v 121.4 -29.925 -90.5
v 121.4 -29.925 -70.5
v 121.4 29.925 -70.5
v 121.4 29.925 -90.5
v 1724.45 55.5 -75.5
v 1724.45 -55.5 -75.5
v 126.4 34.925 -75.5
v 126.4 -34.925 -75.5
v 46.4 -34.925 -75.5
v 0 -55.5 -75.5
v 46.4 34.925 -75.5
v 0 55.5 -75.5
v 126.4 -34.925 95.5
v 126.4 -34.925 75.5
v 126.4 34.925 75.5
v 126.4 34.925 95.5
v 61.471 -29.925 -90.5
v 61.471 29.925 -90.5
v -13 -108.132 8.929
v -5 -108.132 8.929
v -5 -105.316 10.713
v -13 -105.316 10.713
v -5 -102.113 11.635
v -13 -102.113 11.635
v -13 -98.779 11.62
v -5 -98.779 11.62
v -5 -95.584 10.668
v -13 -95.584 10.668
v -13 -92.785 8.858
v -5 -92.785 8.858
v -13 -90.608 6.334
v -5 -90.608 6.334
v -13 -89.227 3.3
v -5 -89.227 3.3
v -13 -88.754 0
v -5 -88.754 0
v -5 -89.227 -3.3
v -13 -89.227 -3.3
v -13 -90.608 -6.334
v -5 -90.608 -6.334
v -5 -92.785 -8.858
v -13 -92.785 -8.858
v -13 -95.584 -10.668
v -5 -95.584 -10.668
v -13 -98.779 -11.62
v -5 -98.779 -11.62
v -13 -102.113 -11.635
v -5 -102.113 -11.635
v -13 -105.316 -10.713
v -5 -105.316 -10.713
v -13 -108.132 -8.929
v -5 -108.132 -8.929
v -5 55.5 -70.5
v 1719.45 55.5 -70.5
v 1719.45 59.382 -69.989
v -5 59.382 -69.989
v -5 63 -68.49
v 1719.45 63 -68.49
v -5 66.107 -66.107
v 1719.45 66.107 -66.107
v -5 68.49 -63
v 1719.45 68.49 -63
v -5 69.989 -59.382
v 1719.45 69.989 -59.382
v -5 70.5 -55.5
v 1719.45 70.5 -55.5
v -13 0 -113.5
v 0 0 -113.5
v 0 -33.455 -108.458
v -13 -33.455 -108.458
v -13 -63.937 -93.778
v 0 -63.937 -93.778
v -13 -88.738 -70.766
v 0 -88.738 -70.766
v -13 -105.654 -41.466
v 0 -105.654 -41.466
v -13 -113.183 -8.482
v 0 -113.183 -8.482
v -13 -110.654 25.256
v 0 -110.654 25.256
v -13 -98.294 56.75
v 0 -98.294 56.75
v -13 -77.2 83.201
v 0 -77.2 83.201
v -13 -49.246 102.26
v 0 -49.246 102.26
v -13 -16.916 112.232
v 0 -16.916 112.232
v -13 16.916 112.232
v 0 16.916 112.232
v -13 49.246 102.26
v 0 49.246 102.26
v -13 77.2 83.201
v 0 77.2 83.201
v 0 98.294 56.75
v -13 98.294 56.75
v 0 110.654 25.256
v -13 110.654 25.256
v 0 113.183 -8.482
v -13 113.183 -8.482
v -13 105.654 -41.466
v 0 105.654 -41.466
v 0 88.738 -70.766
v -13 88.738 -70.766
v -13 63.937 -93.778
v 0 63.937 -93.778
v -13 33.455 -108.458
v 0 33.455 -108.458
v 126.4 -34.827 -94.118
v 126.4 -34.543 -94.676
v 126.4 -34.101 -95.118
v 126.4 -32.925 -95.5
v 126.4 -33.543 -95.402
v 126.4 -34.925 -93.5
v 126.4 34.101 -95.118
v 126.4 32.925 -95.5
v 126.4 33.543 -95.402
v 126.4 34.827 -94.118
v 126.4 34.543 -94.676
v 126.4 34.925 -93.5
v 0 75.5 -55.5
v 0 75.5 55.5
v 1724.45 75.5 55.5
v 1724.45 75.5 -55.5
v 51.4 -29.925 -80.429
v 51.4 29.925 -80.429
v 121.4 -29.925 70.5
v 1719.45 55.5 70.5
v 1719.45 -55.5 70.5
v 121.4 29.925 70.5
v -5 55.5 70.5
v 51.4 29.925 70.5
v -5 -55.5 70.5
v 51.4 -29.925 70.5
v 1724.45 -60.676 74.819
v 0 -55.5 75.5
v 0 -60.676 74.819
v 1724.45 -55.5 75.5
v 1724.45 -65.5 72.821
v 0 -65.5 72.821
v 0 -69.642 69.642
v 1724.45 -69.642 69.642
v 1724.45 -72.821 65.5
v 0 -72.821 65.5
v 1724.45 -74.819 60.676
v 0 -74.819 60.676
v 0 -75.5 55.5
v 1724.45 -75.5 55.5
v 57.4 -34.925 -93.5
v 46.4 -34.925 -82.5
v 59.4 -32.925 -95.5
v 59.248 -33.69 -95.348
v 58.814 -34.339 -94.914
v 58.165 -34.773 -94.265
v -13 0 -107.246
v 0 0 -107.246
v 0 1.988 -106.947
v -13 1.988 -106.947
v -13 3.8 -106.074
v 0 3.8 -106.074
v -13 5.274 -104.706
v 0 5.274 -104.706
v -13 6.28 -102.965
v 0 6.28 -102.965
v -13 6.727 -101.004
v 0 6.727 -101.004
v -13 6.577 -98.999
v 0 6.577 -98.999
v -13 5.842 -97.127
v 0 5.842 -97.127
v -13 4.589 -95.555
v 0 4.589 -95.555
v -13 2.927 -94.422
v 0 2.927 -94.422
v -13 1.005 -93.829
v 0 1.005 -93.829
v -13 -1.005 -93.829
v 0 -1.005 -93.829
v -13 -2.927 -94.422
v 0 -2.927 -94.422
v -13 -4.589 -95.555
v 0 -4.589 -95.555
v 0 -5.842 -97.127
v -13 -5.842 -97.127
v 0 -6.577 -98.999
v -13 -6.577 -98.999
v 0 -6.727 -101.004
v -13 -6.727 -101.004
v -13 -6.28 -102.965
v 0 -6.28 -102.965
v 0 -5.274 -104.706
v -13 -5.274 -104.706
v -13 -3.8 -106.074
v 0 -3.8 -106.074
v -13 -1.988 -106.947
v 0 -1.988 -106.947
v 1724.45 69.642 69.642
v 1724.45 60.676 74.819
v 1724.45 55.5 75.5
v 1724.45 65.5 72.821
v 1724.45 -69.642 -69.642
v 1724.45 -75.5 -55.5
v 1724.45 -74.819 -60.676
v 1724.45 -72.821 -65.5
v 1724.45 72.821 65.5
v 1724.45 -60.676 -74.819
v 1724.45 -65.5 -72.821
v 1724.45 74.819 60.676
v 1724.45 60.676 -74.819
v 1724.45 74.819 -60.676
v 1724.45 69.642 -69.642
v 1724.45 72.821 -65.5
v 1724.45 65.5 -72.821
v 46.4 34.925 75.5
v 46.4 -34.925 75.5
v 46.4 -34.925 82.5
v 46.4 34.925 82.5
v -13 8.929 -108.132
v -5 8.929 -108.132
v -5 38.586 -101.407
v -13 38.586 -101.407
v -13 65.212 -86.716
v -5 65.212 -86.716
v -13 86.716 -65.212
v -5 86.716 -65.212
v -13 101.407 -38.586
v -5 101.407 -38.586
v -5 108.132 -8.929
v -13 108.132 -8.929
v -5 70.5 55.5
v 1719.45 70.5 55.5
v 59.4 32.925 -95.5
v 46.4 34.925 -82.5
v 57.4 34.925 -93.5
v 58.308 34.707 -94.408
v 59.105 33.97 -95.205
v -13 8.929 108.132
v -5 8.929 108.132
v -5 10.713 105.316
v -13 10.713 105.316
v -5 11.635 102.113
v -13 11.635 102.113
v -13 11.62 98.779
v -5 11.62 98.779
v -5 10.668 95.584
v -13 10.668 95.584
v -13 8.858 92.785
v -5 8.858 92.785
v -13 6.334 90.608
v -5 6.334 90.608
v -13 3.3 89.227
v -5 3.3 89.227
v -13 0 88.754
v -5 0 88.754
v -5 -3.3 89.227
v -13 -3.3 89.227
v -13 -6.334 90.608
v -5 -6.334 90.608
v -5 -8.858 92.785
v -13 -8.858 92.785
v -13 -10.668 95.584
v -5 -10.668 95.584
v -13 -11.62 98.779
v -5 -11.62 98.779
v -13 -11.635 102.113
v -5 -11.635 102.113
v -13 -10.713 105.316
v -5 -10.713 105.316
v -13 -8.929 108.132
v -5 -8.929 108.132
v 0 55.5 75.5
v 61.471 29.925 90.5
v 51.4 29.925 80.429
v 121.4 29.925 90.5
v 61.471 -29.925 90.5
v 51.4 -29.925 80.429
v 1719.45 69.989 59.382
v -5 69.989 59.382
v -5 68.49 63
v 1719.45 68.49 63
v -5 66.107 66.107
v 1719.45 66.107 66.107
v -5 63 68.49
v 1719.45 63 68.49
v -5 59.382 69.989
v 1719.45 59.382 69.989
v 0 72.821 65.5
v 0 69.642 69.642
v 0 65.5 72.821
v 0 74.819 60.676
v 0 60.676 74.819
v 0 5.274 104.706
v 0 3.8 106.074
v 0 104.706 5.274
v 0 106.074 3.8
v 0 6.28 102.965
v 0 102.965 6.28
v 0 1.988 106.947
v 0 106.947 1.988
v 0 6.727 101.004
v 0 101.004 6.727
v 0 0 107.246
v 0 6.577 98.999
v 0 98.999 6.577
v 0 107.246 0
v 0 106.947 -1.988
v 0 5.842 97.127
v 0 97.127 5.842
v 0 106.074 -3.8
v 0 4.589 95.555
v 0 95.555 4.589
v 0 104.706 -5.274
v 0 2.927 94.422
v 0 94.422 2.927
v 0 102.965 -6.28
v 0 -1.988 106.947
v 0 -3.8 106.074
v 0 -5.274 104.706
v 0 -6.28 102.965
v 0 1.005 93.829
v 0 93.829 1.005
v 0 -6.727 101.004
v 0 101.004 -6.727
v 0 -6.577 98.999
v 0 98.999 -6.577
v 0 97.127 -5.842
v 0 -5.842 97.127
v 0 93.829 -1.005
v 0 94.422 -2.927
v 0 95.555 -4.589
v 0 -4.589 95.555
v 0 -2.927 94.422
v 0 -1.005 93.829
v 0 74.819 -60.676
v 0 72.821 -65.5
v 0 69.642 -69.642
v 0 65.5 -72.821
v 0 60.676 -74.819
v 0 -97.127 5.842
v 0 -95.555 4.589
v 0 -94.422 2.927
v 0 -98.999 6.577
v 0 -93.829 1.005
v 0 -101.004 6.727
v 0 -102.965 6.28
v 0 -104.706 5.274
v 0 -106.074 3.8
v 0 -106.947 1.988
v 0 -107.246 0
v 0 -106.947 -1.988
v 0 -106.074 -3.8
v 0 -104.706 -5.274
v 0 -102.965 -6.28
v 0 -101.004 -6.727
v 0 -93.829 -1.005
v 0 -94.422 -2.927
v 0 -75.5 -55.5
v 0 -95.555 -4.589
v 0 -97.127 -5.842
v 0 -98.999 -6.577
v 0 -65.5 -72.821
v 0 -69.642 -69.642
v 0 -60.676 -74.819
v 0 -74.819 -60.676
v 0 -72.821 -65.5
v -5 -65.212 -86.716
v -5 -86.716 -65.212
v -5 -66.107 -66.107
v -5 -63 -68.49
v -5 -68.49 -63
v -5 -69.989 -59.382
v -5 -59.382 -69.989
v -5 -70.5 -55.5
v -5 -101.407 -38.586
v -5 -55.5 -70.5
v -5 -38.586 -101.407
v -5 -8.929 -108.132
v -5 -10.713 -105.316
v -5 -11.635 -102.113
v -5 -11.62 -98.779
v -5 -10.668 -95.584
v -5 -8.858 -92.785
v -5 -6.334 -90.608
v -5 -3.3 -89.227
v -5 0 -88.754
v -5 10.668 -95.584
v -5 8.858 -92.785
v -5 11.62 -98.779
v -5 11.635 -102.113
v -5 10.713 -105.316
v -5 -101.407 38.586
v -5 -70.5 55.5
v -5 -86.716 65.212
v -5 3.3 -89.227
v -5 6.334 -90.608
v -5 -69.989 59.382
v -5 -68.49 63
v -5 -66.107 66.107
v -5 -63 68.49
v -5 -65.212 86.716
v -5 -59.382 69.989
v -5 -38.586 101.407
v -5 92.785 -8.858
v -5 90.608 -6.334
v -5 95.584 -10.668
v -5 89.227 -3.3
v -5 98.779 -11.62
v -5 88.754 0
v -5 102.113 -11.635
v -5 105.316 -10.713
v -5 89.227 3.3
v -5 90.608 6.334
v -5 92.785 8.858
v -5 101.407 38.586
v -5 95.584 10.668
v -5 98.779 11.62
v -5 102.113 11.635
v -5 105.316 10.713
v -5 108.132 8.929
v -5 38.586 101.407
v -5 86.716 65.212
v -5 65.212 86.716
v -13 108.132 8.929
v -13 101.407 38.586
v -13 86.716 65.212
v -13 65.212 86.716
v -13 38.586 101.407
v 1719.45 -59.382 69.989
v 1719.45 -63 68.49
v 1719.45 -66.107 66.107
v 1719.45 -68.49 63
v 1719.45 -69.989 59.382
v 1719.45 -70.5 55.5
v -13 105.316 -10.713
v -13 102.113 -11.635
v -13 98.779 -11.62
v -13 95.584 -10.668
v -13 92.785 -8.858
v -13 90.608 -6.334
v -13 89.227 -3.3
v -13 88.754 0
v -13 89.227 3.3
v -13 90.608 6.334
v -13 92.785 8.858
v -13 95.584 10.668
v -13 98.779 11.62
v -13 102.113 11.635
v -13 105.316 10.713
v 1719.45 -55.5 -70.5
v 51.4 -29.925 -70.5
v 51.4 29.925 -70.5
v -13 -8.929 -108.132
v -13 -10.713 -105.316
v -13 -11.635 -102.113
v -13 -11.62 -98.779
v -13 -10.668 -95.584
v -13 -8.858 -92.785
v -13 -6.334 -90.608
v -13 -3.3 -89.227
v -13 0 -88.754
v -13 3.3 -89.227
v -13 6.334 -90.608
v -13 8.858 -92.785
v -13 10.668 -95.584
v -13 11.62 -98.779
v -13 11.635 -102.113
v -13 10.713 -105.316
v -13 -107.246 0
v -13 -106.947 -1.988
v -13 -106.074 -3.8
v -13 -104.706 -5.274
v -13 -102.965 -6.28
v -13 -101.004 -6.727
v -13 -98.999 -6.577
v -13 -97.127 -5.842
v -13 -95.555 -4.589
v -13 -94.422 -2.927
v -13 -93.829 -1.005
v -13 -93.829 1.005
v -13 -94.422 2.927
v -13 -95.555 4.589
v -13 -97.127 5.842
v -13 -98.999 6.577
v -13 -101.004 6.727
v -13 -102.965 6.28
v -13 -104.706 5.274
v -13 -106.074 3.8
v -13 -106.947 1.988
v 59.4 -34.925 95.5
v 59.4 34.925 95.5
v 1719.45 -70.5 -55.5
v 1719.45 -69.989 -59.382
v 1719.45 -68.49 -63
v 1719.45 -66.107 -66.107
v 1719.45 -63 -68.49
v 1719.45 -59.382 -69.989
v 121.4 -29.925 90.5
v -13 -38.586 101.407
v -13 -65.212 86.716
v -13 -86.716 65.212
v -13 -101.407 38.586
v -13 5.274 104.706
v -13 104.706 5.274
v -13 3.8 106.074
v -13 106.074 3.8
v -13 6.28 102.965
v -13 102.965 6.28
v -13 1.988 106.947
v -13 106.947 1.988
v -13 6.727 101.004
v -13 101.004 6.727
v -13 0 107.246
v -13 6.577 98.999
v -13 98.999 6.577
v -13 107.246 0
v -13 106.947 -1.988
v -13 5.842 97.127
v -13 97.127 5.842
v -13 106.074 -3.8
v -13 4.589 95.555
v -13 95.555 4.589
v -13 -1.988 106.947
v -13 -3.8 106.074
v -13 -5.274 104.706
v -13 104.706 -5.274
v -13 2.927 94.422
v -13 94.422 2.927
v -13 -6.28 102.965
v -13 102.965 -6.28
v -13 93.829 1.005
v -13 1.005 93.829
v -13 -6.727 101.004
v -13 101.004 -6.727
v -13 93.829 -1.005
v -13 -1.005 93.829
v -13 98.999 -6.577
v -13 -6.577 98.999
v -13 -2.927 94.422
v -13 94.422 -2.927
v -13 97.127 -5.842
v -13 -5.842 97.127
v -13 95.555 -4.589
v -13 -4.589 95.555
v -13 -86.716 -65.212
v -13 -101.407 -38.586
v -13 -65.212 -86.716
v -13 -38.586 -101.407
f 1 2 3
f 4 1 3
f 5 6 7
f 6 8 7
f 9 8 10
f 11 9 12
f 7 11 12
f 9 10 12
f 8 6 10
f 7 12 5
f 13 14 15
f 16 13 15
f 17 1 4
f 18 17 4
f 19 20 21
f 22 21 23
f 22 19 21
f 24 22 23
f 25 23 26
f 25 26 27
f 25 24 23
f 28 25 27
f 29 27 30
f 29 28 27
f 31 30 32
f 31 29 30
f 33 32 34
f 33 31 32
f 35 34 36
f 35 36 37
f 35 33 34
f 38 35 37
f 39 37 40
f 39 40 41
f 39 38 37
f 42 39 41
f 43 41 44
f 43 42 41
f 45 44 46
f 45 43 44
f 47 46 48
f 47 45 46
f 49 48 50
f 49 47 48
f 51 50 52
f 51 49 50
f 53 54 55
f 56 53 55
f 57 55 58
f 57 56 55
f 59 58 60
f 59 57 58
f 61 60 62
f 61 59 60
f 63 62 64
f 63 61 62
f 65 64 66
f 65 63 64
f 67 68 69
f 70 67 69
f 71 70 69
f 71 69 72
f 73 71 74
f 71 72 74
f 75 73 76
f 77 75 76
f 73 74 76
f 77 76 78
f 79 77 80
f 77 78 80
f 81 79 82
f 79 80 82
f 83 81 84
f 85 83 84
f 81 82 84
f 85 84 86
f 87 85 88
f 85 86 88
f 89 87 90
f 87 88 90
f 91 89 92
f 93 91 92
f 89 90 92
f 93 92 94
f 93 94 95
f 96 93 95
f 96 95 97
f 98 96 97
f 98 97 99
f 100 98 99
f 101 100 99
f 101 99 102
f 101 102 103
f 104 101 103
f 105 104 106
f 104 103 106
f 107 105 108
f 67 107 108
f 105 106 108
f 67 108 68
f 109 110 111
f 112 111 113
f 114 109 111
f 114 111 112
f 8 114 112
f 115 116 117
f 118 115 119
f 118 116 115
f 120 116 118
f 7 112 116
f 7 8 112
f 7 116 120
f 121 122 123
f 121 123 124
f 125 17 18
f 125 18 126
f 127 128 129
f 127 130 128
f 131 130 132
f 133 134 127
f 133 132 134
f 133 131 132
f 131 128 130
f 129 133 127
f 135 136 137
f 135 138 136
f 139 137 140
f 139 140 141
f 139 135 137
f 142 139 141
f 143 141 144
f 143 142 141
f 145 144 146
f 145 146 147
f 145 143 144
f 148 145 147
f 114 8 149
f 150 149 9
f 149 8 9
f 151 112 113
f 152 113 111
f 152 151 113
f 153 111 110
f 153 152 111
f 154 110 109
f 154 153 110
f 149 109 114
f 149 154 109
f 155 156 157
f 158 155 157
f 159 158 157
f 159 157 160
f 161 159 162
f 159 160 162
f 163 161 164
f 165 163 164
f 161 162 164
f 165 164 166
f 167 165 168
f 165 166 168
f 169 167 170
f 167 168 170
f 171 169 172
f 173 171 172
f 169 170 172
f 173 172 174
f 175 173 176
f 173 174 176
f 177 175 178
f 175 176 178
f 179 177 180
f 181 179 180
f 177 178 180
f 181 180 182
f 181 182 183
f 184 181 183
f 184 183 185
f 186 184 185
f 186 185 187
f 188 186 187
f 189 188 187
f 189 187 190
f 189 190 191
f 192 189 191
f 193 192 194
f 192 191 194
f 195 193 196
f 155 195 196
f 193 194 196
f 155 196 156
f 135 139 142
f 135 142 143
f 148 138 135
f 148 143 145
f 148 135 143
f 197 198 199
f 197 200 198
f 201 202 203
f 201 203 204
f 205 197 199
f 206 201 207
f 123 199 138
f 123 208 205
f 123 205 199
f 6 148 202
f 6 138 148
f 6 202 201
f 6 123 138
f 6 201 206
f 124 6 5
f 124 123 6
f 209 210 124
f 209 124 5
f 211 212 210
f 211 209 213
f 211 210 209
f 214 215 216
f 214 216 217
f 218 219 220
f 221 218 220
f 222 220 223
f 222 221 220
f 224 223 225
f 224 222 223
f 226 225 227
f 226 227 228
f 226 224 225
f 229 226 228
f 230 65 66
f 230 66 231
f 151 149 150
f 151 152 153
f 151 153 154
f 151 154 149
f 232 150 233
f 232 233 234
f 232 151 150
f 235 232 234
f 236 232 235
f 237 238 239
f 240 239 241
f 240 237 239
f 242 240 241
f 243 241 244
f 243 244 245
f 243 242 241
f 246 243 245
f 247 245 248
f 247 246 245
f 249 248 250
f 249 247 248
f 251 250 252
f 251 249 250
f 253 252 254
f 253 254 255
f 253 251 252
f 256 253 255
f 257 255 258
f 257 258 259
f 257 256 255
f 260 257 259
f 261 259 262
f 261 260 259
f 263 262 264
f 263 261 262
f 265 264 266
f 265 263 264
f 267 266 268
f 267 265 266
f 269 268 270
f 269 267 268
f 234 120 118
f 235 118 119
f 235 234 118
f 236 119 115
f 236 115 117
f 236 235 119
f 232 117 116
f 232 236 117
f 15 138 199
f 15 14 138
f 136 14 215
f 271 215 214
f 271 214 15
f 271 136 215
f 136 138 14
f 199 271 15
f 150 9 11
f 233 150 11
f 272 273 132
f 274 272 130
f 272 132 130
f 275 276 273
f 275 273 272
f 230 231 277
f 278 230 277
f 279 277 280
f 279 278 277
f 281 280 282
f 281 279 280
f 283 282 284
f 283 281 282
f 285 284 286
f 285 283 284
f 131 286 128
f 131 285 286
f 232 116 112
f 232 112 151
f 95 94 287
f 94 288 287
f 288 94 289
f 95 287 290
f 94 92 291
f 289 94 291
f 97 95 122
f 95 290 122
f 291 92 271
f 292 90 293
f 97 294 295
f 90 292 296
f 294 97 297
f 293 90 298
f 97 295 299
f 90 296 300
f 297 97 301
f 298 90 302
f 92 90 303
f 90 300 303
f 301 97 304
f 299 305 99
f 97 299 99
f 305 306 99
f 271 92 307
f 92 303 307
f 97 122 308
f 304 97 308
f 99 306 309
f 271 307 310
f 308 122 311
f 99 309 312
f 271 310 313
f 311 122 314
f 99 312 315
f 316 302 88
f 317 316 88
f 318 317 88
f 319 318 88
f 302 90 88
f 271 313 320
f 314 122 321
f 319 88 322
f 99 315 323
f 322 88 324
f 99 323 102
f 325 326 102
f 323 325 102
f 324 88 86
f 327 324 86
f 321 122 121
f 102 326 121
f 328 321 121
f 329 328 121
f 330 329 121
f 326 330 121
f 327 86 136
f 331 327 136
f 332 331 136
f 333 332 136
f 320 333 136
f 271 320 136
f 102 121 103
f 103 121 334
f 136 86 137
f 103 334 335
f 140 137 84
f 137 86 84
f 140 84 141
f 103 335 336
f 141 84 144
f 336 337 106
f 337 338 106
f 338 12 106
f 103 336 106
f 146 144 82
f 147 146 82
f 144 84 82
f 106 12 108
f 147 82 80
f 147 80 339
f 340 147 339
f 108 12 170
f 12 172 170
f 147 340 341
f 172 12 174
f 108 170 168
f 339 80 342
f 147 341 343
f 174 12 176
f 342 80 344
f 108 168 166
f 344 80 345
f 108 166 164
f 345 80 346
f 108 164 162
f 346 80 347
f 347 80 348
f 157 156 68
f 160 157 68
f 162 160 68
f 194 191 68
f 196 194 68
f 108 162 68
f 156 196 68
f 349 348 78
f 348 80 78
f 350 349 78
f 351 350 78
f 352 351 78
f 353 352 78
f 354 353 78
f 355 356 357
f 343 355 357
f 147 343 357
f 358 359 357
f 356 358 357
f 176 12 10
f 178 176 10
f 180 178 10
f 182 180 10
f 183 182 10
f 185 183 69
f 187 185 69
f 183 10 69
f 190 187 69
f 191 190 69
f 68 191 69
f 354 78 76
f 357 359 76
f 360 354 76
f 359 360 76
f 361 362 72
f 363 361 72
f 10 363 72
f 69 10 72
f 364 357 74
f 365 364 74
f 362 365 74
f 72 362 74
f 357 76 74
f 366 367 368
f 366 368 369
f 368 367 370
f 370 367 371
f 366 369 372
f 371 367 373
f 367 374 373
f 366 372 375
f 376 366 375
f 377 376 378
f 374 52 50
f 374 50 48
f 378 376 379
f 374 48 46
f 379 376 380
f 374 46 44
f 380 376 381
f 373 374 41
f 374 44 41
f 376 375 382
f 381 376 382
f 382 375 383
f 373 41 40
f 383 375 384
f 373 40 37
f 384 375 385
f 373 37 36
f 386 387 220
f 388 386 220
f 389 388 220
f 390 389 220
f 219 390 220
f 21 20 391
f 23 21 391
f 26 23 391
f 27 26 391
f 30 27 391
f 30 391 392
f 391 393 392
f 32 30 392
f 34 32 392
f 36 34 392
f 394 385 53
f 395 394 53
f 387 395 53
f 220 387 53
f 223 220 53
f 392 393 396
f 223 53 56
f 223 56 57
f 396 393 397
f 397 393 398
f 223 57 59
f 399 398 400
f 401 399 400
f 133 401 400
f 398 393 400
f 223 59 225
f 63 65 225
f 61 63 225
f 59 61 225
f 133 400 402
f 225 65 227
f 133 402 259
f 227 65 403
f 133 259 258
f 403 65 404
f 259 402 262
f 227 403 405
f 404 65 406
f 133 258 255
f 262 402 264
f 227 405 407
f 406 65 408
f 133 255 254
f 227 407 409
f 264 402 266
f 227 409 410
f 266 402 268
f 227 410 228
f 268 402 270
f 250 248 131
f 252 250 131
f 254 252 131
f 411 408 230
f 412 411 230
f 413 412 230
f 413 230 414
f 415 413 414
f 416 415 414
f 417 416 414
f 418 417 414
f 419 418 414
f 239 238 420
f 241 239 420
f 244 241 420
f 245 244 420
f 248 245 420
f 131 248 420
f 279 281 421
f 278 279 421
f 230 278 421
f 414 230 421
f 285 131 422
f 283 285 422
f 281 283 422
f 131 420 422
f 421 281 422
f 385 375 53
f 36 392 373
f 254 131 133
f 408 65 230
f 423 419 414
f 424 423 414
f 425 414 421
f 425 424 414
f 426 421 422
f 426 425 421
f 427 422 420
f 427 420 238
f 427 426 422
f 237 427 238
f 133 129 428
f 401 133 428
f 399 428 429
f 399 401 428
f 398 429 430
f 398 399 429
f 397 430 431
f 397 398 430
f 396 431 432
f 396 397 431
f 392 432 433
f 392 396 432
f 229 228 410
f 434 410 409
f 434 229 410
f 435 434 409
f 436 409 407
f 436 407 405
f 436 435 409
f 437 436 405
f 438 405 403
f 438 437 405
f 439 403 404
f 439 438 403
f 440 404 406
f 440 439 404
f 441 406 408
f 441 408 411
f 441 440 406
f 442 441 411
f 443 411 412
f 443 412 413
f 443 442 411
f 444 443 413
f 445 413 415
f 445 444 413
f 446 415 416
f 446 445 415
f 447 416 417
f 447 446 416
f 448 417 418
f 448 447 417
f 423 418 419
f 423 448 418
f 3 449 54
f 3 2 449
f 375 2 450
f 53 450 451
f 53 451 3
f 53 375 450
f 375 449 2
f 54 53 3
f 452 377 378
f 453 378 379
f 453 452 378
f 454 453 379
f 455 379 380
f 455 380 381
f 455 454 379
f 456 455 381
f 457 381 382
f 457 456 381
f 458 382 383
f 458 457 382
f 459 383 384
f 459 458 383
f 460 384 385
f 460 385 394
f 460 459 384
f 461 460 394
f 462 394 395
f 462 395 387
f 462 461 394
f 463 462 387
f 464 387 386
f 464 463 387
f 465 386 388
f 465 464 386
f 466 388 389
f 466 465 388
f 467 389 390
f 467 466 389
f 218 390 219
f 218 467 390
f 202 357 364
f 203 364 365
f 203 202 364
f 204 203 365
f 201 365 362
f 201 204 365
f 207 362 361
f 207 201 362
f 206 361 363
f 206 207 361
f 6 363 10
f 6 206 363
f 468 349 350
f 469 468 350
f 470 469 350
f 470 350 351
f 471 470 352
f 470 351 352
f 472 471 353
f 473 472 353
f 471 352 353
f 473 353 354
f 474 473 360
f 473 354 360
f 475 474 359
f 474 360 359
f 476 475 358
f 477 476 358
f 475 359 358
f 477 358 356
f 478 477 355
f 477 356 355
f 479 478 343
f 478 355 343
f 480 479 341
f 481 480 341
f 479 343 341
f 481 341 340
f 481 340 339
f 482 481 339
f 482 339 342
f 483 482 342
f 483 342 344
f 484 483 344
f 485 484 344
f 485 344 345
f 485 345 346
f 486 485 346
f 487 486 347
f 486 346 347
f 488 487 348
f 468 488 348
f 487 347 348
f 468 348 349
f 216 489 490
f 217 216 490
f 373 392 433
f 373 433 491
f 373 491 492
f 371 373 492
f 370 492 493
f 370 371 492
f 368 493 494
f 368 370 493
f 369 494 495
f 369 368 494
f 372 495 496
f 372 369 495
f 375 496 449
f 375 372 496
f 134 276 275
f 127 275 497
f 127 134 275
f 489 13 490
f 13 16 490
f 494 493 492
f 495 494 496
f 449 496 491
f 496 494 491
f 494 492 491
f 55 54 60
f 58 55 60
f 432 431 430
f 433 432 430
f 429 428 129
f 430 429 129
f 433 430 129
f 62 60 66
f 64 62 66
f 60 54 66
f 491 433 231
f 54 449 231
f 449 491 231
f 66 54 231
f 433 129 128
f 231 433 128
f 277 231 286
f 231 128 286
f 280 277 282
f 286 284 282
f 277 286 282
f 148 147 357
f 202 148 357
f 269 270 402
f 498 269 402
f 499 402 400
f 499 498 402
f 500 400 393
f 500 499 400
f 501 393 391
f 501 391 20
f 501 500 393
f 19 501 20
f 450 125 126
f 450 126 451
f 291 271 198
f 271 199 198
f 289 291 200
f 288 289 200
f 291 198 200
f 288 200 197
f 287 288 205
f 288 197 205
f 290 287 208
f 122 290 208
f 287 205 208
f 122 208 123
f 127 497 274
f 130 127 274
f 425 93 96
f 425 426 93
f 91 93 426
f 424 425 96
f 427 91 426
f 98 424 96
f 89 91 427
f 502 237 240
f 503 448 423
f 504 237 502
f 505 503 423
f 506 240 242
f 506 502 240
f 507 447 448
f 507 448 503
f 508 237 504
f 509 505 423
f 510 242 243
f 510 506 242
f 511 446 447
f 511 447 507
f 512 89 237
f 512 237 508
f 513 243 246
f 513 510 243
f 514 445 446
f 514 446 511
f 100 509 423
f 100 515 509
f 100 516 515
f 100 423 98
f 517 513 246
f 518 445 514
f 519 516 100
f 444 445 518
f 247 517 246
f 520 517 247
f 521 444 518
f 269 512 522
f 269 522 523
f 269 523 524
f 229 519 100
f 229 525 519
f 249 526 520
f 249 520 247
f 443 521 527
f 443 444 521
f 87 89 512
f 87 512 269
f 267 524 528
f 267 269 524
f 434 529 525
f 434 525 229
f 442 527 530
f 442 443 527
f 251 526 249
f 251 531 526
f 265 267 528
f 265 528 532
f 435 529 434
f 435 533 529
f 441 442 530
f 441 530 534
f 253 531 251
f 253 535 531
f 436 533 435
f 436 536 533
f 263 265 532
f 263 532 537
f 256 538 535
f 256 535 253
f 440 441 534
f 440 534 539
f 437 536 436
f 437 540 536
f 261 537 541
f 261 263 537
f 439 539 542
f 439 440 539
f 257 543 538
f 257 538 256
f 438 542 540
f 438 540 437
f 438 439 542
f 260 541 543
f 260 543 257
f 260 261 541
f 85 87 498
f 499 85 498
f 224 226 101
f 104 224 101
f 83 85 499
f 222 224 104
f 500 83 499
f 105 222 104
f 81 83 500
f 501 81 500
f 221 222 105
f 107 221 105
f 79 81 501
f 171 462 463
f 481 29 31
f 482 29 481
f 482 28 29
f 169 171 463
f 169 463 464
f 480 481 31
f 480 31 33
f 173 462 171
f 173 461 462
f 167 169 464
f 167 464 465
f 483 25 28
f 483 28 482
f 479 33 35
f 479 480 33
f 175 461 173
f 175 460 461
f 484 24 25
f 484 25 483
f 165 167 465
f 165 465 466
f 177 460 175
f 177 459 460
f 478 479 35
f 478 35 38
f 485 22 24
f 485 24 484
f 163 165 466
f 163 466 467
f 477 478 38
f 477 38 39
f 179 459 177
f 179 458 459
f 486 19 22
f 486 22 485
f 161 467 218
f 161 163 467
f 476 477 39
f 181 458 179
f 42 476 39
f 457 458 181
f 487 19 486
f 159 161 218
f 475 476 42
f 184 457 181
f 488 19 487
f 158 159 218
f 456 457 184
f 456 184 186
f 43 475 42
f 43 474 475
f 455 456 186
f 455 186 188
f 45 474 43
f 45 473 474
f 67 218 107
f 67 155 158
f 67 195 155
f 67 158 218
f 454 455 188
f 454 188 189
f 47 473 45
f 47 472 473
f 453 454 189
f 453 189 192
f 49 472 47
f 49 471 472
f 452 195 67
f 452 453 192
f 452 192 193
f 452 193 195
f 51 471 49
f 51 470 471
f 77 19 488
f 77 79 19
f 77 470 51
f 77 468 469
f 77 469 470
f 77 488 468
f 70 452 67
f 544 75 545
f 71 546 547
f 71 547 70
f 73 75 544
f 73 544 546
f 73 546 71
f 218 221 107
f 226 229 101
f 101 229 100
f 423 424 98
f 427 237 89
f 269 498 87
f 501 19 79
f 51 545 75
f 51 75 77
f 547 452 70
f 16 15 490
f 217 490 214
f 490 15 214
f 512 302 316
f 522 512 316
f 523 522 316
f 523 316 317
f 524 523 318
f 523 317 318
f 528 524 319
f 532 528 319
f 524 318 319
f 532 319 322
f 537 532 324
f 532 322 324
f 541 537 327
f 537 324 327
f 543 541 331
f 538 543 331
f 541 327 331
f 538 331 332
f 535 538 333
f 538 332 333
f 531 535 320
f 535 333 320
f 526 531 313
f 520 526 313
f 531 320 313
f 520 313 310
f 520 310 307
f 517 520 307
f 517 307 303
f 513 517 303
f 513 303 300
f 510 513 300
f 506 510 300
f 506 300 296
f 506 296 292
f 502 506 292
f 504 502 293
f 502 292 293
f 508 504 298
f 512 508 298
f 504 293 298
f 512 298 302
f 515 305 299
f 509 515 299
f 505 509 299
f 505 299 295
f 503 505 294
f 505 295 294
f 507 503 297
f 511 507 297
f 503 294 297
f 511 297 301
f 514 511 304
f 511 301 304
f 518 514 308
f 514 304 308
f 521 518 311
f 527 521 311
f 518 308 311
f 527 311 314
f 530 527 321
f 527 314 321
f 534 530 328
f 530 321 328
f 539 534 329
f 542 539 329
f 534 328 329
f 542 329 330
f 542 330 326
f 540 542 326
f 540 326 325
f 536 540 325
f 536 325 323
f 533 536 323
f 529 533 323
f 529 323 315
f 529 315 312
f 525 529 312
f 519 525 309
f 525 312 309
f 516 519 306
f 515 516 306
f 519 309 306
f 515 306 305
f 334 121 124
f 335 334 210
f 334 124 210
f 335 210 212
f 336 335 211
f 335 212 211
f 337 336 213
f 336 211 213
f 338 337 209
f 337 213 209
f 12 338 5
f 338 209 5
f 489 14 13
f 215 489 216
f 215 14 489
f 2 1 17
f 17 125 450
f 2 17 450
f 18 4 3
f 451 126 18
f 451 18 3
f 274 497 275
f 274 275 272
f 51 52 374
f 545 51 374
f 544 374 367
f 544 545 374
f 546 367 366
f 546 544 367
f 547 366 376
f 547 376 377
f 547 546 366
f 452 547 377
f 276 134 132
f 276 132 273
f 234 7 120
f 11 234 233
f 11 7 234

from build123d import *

# Parameters (mm, degrees)
SKETCH3_W                = 151
SKETCH3_H                = 151
BOSS_EXTRUDE2_DEPTH      = 1724.45
SKETCH4_R                = 113.5
BOSS_EXTRUDE3_DEPTH      = 13
SKETCH5_R                = 6.74624
CUT_EXTRUDE1_DEPTH       = 13
CIRPATTERN1_COUNT        = 4
FILLET1_R                = 20
SKETCH6_W                = 80
SKETCH6_H                = 69.85
BOSS_EXTRUDE4_DEPTH      = 20
CHAMFER1_SIZE            = 13
FILLET2_R                = 2
CHAMFER1_OF_MIRROR1_SIZE = 13
SHELL1_START             = -13
SHELL1_DEPTH             = 1732.45
SHELL1_START_2           = 61.471067812
SHELL1_2_OUTLINE_W       = 59.85
SHELL1_2_OUTLINE_H       = 20
SHELL1_2_DEPTH           = 59.928932188
SHELL1_3_DEPTH           = 8
SHELL1_START_3           = -29.925
SHELL1_4_DEPTH           = 59.85


with BuildPart() as part:
    # Sketch3 → Boss-Extrude2 (new body)
    with BuildSketch(Plane(origin=(0, 0, 0), x_dir=(0, 0, -1), z_dir=(1, 0, 0))):
        Rectangle(SKETCH3_W, SKETCH3_H)
    extrude(amount=BOSS_EXTRUDE2_DEPTH)

    # Sketch4 → Boss-Extrude3 (add)
    with BuildSketch(Plane.ZY):
        with Locations(Location((0, 0, 0), (0, 0, 180))):
            Circle(SKETCH4_R)
    extrude(amount=BOSS_EXTRUDE3_DEPTH)

    # Sketch5 → Cut-Extrude1 (cut)
    with BuildSketch(Plane(origin=(0, 0, 0), x_dir=(0, 0, -1), z_dir=(1, 0, 0))):
        with Locations((100.5, 0)):
            Circle(SKETCH5_R)
    cut_extrude1 = extrude(amount=-CUT_EXTRUDE1_DEPTH, mode=Mode.SUBTRACT)

    # CirPattern1: Cut-Extrude1 ×4 about axis
    cirpattern1_axis = Axis((0, 0, 0), (1, 0, 0))
    for i in range(1, CIRPATTERN1_COUNT):
        add(cut_extrude1.rotate(cirpattern1_axis, i * 360 / CIRPATTERN1_COUNT), mode=Mode.SUBTRACT)

    # Fillet1
    fillet1_edges = [part.edges().sort_by_distance(p)[0] for p in [
        (862.225, -75.5, -75.5),
        (862.225, -75.5, 75.5),
        (862.225, 75.5, 75.5),
        (862.225, 75.5, -75.5),
    ]]
    fillet(fillet1_edges, radius=FILLET1_R)

    # Sketch6 → Boss-Extrude4 (add)
    with BuildSketch(Plane(origin=(0, 0, -75.5), x_dir=(-1, 0, 0), z_dir=(0, 0, -1))):
        with Locations((-86.4, 0)):
            Rectangle(SKETCH6_W, SKETCH6_H)
    boss_extrude4 = extrude(amount=BOSS_EXTRUDE4_DEPTH)

    # Chamfer1
    chamfer1_edges = [part.edges().sort_by_distance(p)[0] for p in [
        (46.4, 0, -95.5),
    ]]
    chamfer(chamfer1_edges, length=CHAMFER1_SIZE)

    # Fillet2
    fillet2_edges = [part.edges().sort_by_distance(p)[0] for p in [
        (92.9, -34.925, -95.5),
        (92.9, 34.925, -95.5),
    ]]
    fillet(fillet2_edges, radius=FILLET2_R)

    # Mirror1: Boss-Extrude4 across plane
    add(boss_extrude4.mirror(Plane.XY))

    # Chamfer1 of Mirror1
    chamfer1_of_mirror1_edges = [part.edges().sort_by_distance(p)[0] for p in [
        (46.4, 0, 95.5),
    ]]
    chamfer(chamfer1_of_mirror1_edges, length=CHAMFER1_OF_MIRROR1_SIZE)

    # Shell1: read off the stored shape, not the designer's step
    # Shell1 outline → Shell1 (cut)
    with BuildSketch(Plane.YZ.offset(SHELL1_START)):
        with BuildLine():
            Line((55.5, 70.5), (-55.5, 70.5))
            ThreePointArc((-55.5, 70.5), (-66.106601718, 66.106601718), (-70.5, 55.5))
            Line((-70.5, 55.5), (-70.5, -55.5))
            ThreePointArc((-70.5, -55.5), (-66.106601718, -66.106601718), (-55.5, -70.5))
            Line((-55.5, -70.5), (55.5, -70.5))
            ThreePointArc((55.5, -70.5), (66.106601718, -66.106601718), (70.5, -55.5))
            Line((70.5, -55.5), (70.5, 55.5))
            ThreePointArc((70.5, 55.5), (66.106601718, 66.106601718), (55.5, 70.5))
        make_face()
    extrude(amount=SHELL1_DEPTH, mode=Mode.SUBTRACT)

    # Shell1 2 outline → Shell1 2 (cut)
    with BuildSketch(Plane.YZ.offset(SHELL1_START_2)):
        with Locations((0, 80.5)):
            Rectangle(SHELL1_2_OUTLINE_W, SHELL1_2_OUTLINE_H)
        with Locations((0, -80.5)):
            Rectangle(SHELL1_2_OUTLINE_W, SHELL1_2_OUTLINE_H)
    extrude(amount=SHELL1_2_DEPTH, mode=Mode.SUBTRACT)

    # Shell1 3 outline → Shell1 3 (cut)
    with BuildSketch(Plane.YZ.offset(SHELL1_START)):
        with BuildLine():
            ThreePointArc((108.131969382, -8.929008763), (88.75376, 0), (108.131969382, 8.929008763))
            ThreePointArc((108.131969382, 8.929008763), (76.721085759, 76.721085759), (8.929008763, 108.131969382))
            ThreePointArc((8.929008763, 108.131969382), (0, 88.75376), (-8.929008763, 108.131969382))
            ThreePointArc((-8.929008763, 108.131969382), (-76.721085759, 76.721085759), (-108.131969382, 8.929008763))
            ThreePointArc((-108.131969382, 8.929008763), (-88.75376, 0), (-108.131969382, -8.929008763))
            ThreePointArc((-108.131969382, -8.929008763), (-76.721085759, -76.721085759), (-8.929008763, -108.131969382))
            ThreePointArc((-8.929008763, -108.131969382), (0, -88.75376), (8.929008763, -108.131969382))
            ThreePointArc((8.929008763, -108.131969382), (76.721085759, -76.721085759), (108.131969382, -8.929008763))
        make_face()
        with BuildLine():
            Line((55.5, -70.5), (-55.5, -70.5))
            ThreePointArc((-55.5, -70.5), (-66.106601718, -66.106601718), (-70.5, -55.5))
            Line((-70.5, -55.5), (-70.5, 55.5))
            ThreePointArc((-70.5, 55.5), (-66.106601718, 66.106601718), (-55.5, 70.5))
            Line((-55.5, 70.5), (55.5, 70.5))
            ThreePointArc((55.5, 70.5), (66.106601718, 66.106601718), (70.5, 55.5))
            Line((70.5, 55.5), (70.5, -55.5))
            ThreePointArc((70.5, -55.5), (66.106601718, -66.106601718), (55.5, -70.5))
        make_face(mode=Mode.SUBTRACT)
    extrude(amount=SHELL1_3_DEPTH, mode=Mode.SUBTRACT)

    # Shell1 4 outline → Shell1 4 (cut)
    with BuildSketch(Plane(origin=(0, 0, 0), x_dir=(1, 0, 0), z_dir=(0, 1, 0)).offset(SHELL1_START_3)):
        Polygon((51.4, 80.428932188), (51.4, 70.5), (61.471067812, 70.5), (61.471067812, 90.5), align=None)
        Polygon((61.471067812, -70.5), (51.4, -70.5), (51.4, -80.428932188), (61.471067812, -90.5), align=None)
    extrude(amount=SHELL1_4_DEPTH, mode=Mode.SUBTRACT)


solid = part.part
